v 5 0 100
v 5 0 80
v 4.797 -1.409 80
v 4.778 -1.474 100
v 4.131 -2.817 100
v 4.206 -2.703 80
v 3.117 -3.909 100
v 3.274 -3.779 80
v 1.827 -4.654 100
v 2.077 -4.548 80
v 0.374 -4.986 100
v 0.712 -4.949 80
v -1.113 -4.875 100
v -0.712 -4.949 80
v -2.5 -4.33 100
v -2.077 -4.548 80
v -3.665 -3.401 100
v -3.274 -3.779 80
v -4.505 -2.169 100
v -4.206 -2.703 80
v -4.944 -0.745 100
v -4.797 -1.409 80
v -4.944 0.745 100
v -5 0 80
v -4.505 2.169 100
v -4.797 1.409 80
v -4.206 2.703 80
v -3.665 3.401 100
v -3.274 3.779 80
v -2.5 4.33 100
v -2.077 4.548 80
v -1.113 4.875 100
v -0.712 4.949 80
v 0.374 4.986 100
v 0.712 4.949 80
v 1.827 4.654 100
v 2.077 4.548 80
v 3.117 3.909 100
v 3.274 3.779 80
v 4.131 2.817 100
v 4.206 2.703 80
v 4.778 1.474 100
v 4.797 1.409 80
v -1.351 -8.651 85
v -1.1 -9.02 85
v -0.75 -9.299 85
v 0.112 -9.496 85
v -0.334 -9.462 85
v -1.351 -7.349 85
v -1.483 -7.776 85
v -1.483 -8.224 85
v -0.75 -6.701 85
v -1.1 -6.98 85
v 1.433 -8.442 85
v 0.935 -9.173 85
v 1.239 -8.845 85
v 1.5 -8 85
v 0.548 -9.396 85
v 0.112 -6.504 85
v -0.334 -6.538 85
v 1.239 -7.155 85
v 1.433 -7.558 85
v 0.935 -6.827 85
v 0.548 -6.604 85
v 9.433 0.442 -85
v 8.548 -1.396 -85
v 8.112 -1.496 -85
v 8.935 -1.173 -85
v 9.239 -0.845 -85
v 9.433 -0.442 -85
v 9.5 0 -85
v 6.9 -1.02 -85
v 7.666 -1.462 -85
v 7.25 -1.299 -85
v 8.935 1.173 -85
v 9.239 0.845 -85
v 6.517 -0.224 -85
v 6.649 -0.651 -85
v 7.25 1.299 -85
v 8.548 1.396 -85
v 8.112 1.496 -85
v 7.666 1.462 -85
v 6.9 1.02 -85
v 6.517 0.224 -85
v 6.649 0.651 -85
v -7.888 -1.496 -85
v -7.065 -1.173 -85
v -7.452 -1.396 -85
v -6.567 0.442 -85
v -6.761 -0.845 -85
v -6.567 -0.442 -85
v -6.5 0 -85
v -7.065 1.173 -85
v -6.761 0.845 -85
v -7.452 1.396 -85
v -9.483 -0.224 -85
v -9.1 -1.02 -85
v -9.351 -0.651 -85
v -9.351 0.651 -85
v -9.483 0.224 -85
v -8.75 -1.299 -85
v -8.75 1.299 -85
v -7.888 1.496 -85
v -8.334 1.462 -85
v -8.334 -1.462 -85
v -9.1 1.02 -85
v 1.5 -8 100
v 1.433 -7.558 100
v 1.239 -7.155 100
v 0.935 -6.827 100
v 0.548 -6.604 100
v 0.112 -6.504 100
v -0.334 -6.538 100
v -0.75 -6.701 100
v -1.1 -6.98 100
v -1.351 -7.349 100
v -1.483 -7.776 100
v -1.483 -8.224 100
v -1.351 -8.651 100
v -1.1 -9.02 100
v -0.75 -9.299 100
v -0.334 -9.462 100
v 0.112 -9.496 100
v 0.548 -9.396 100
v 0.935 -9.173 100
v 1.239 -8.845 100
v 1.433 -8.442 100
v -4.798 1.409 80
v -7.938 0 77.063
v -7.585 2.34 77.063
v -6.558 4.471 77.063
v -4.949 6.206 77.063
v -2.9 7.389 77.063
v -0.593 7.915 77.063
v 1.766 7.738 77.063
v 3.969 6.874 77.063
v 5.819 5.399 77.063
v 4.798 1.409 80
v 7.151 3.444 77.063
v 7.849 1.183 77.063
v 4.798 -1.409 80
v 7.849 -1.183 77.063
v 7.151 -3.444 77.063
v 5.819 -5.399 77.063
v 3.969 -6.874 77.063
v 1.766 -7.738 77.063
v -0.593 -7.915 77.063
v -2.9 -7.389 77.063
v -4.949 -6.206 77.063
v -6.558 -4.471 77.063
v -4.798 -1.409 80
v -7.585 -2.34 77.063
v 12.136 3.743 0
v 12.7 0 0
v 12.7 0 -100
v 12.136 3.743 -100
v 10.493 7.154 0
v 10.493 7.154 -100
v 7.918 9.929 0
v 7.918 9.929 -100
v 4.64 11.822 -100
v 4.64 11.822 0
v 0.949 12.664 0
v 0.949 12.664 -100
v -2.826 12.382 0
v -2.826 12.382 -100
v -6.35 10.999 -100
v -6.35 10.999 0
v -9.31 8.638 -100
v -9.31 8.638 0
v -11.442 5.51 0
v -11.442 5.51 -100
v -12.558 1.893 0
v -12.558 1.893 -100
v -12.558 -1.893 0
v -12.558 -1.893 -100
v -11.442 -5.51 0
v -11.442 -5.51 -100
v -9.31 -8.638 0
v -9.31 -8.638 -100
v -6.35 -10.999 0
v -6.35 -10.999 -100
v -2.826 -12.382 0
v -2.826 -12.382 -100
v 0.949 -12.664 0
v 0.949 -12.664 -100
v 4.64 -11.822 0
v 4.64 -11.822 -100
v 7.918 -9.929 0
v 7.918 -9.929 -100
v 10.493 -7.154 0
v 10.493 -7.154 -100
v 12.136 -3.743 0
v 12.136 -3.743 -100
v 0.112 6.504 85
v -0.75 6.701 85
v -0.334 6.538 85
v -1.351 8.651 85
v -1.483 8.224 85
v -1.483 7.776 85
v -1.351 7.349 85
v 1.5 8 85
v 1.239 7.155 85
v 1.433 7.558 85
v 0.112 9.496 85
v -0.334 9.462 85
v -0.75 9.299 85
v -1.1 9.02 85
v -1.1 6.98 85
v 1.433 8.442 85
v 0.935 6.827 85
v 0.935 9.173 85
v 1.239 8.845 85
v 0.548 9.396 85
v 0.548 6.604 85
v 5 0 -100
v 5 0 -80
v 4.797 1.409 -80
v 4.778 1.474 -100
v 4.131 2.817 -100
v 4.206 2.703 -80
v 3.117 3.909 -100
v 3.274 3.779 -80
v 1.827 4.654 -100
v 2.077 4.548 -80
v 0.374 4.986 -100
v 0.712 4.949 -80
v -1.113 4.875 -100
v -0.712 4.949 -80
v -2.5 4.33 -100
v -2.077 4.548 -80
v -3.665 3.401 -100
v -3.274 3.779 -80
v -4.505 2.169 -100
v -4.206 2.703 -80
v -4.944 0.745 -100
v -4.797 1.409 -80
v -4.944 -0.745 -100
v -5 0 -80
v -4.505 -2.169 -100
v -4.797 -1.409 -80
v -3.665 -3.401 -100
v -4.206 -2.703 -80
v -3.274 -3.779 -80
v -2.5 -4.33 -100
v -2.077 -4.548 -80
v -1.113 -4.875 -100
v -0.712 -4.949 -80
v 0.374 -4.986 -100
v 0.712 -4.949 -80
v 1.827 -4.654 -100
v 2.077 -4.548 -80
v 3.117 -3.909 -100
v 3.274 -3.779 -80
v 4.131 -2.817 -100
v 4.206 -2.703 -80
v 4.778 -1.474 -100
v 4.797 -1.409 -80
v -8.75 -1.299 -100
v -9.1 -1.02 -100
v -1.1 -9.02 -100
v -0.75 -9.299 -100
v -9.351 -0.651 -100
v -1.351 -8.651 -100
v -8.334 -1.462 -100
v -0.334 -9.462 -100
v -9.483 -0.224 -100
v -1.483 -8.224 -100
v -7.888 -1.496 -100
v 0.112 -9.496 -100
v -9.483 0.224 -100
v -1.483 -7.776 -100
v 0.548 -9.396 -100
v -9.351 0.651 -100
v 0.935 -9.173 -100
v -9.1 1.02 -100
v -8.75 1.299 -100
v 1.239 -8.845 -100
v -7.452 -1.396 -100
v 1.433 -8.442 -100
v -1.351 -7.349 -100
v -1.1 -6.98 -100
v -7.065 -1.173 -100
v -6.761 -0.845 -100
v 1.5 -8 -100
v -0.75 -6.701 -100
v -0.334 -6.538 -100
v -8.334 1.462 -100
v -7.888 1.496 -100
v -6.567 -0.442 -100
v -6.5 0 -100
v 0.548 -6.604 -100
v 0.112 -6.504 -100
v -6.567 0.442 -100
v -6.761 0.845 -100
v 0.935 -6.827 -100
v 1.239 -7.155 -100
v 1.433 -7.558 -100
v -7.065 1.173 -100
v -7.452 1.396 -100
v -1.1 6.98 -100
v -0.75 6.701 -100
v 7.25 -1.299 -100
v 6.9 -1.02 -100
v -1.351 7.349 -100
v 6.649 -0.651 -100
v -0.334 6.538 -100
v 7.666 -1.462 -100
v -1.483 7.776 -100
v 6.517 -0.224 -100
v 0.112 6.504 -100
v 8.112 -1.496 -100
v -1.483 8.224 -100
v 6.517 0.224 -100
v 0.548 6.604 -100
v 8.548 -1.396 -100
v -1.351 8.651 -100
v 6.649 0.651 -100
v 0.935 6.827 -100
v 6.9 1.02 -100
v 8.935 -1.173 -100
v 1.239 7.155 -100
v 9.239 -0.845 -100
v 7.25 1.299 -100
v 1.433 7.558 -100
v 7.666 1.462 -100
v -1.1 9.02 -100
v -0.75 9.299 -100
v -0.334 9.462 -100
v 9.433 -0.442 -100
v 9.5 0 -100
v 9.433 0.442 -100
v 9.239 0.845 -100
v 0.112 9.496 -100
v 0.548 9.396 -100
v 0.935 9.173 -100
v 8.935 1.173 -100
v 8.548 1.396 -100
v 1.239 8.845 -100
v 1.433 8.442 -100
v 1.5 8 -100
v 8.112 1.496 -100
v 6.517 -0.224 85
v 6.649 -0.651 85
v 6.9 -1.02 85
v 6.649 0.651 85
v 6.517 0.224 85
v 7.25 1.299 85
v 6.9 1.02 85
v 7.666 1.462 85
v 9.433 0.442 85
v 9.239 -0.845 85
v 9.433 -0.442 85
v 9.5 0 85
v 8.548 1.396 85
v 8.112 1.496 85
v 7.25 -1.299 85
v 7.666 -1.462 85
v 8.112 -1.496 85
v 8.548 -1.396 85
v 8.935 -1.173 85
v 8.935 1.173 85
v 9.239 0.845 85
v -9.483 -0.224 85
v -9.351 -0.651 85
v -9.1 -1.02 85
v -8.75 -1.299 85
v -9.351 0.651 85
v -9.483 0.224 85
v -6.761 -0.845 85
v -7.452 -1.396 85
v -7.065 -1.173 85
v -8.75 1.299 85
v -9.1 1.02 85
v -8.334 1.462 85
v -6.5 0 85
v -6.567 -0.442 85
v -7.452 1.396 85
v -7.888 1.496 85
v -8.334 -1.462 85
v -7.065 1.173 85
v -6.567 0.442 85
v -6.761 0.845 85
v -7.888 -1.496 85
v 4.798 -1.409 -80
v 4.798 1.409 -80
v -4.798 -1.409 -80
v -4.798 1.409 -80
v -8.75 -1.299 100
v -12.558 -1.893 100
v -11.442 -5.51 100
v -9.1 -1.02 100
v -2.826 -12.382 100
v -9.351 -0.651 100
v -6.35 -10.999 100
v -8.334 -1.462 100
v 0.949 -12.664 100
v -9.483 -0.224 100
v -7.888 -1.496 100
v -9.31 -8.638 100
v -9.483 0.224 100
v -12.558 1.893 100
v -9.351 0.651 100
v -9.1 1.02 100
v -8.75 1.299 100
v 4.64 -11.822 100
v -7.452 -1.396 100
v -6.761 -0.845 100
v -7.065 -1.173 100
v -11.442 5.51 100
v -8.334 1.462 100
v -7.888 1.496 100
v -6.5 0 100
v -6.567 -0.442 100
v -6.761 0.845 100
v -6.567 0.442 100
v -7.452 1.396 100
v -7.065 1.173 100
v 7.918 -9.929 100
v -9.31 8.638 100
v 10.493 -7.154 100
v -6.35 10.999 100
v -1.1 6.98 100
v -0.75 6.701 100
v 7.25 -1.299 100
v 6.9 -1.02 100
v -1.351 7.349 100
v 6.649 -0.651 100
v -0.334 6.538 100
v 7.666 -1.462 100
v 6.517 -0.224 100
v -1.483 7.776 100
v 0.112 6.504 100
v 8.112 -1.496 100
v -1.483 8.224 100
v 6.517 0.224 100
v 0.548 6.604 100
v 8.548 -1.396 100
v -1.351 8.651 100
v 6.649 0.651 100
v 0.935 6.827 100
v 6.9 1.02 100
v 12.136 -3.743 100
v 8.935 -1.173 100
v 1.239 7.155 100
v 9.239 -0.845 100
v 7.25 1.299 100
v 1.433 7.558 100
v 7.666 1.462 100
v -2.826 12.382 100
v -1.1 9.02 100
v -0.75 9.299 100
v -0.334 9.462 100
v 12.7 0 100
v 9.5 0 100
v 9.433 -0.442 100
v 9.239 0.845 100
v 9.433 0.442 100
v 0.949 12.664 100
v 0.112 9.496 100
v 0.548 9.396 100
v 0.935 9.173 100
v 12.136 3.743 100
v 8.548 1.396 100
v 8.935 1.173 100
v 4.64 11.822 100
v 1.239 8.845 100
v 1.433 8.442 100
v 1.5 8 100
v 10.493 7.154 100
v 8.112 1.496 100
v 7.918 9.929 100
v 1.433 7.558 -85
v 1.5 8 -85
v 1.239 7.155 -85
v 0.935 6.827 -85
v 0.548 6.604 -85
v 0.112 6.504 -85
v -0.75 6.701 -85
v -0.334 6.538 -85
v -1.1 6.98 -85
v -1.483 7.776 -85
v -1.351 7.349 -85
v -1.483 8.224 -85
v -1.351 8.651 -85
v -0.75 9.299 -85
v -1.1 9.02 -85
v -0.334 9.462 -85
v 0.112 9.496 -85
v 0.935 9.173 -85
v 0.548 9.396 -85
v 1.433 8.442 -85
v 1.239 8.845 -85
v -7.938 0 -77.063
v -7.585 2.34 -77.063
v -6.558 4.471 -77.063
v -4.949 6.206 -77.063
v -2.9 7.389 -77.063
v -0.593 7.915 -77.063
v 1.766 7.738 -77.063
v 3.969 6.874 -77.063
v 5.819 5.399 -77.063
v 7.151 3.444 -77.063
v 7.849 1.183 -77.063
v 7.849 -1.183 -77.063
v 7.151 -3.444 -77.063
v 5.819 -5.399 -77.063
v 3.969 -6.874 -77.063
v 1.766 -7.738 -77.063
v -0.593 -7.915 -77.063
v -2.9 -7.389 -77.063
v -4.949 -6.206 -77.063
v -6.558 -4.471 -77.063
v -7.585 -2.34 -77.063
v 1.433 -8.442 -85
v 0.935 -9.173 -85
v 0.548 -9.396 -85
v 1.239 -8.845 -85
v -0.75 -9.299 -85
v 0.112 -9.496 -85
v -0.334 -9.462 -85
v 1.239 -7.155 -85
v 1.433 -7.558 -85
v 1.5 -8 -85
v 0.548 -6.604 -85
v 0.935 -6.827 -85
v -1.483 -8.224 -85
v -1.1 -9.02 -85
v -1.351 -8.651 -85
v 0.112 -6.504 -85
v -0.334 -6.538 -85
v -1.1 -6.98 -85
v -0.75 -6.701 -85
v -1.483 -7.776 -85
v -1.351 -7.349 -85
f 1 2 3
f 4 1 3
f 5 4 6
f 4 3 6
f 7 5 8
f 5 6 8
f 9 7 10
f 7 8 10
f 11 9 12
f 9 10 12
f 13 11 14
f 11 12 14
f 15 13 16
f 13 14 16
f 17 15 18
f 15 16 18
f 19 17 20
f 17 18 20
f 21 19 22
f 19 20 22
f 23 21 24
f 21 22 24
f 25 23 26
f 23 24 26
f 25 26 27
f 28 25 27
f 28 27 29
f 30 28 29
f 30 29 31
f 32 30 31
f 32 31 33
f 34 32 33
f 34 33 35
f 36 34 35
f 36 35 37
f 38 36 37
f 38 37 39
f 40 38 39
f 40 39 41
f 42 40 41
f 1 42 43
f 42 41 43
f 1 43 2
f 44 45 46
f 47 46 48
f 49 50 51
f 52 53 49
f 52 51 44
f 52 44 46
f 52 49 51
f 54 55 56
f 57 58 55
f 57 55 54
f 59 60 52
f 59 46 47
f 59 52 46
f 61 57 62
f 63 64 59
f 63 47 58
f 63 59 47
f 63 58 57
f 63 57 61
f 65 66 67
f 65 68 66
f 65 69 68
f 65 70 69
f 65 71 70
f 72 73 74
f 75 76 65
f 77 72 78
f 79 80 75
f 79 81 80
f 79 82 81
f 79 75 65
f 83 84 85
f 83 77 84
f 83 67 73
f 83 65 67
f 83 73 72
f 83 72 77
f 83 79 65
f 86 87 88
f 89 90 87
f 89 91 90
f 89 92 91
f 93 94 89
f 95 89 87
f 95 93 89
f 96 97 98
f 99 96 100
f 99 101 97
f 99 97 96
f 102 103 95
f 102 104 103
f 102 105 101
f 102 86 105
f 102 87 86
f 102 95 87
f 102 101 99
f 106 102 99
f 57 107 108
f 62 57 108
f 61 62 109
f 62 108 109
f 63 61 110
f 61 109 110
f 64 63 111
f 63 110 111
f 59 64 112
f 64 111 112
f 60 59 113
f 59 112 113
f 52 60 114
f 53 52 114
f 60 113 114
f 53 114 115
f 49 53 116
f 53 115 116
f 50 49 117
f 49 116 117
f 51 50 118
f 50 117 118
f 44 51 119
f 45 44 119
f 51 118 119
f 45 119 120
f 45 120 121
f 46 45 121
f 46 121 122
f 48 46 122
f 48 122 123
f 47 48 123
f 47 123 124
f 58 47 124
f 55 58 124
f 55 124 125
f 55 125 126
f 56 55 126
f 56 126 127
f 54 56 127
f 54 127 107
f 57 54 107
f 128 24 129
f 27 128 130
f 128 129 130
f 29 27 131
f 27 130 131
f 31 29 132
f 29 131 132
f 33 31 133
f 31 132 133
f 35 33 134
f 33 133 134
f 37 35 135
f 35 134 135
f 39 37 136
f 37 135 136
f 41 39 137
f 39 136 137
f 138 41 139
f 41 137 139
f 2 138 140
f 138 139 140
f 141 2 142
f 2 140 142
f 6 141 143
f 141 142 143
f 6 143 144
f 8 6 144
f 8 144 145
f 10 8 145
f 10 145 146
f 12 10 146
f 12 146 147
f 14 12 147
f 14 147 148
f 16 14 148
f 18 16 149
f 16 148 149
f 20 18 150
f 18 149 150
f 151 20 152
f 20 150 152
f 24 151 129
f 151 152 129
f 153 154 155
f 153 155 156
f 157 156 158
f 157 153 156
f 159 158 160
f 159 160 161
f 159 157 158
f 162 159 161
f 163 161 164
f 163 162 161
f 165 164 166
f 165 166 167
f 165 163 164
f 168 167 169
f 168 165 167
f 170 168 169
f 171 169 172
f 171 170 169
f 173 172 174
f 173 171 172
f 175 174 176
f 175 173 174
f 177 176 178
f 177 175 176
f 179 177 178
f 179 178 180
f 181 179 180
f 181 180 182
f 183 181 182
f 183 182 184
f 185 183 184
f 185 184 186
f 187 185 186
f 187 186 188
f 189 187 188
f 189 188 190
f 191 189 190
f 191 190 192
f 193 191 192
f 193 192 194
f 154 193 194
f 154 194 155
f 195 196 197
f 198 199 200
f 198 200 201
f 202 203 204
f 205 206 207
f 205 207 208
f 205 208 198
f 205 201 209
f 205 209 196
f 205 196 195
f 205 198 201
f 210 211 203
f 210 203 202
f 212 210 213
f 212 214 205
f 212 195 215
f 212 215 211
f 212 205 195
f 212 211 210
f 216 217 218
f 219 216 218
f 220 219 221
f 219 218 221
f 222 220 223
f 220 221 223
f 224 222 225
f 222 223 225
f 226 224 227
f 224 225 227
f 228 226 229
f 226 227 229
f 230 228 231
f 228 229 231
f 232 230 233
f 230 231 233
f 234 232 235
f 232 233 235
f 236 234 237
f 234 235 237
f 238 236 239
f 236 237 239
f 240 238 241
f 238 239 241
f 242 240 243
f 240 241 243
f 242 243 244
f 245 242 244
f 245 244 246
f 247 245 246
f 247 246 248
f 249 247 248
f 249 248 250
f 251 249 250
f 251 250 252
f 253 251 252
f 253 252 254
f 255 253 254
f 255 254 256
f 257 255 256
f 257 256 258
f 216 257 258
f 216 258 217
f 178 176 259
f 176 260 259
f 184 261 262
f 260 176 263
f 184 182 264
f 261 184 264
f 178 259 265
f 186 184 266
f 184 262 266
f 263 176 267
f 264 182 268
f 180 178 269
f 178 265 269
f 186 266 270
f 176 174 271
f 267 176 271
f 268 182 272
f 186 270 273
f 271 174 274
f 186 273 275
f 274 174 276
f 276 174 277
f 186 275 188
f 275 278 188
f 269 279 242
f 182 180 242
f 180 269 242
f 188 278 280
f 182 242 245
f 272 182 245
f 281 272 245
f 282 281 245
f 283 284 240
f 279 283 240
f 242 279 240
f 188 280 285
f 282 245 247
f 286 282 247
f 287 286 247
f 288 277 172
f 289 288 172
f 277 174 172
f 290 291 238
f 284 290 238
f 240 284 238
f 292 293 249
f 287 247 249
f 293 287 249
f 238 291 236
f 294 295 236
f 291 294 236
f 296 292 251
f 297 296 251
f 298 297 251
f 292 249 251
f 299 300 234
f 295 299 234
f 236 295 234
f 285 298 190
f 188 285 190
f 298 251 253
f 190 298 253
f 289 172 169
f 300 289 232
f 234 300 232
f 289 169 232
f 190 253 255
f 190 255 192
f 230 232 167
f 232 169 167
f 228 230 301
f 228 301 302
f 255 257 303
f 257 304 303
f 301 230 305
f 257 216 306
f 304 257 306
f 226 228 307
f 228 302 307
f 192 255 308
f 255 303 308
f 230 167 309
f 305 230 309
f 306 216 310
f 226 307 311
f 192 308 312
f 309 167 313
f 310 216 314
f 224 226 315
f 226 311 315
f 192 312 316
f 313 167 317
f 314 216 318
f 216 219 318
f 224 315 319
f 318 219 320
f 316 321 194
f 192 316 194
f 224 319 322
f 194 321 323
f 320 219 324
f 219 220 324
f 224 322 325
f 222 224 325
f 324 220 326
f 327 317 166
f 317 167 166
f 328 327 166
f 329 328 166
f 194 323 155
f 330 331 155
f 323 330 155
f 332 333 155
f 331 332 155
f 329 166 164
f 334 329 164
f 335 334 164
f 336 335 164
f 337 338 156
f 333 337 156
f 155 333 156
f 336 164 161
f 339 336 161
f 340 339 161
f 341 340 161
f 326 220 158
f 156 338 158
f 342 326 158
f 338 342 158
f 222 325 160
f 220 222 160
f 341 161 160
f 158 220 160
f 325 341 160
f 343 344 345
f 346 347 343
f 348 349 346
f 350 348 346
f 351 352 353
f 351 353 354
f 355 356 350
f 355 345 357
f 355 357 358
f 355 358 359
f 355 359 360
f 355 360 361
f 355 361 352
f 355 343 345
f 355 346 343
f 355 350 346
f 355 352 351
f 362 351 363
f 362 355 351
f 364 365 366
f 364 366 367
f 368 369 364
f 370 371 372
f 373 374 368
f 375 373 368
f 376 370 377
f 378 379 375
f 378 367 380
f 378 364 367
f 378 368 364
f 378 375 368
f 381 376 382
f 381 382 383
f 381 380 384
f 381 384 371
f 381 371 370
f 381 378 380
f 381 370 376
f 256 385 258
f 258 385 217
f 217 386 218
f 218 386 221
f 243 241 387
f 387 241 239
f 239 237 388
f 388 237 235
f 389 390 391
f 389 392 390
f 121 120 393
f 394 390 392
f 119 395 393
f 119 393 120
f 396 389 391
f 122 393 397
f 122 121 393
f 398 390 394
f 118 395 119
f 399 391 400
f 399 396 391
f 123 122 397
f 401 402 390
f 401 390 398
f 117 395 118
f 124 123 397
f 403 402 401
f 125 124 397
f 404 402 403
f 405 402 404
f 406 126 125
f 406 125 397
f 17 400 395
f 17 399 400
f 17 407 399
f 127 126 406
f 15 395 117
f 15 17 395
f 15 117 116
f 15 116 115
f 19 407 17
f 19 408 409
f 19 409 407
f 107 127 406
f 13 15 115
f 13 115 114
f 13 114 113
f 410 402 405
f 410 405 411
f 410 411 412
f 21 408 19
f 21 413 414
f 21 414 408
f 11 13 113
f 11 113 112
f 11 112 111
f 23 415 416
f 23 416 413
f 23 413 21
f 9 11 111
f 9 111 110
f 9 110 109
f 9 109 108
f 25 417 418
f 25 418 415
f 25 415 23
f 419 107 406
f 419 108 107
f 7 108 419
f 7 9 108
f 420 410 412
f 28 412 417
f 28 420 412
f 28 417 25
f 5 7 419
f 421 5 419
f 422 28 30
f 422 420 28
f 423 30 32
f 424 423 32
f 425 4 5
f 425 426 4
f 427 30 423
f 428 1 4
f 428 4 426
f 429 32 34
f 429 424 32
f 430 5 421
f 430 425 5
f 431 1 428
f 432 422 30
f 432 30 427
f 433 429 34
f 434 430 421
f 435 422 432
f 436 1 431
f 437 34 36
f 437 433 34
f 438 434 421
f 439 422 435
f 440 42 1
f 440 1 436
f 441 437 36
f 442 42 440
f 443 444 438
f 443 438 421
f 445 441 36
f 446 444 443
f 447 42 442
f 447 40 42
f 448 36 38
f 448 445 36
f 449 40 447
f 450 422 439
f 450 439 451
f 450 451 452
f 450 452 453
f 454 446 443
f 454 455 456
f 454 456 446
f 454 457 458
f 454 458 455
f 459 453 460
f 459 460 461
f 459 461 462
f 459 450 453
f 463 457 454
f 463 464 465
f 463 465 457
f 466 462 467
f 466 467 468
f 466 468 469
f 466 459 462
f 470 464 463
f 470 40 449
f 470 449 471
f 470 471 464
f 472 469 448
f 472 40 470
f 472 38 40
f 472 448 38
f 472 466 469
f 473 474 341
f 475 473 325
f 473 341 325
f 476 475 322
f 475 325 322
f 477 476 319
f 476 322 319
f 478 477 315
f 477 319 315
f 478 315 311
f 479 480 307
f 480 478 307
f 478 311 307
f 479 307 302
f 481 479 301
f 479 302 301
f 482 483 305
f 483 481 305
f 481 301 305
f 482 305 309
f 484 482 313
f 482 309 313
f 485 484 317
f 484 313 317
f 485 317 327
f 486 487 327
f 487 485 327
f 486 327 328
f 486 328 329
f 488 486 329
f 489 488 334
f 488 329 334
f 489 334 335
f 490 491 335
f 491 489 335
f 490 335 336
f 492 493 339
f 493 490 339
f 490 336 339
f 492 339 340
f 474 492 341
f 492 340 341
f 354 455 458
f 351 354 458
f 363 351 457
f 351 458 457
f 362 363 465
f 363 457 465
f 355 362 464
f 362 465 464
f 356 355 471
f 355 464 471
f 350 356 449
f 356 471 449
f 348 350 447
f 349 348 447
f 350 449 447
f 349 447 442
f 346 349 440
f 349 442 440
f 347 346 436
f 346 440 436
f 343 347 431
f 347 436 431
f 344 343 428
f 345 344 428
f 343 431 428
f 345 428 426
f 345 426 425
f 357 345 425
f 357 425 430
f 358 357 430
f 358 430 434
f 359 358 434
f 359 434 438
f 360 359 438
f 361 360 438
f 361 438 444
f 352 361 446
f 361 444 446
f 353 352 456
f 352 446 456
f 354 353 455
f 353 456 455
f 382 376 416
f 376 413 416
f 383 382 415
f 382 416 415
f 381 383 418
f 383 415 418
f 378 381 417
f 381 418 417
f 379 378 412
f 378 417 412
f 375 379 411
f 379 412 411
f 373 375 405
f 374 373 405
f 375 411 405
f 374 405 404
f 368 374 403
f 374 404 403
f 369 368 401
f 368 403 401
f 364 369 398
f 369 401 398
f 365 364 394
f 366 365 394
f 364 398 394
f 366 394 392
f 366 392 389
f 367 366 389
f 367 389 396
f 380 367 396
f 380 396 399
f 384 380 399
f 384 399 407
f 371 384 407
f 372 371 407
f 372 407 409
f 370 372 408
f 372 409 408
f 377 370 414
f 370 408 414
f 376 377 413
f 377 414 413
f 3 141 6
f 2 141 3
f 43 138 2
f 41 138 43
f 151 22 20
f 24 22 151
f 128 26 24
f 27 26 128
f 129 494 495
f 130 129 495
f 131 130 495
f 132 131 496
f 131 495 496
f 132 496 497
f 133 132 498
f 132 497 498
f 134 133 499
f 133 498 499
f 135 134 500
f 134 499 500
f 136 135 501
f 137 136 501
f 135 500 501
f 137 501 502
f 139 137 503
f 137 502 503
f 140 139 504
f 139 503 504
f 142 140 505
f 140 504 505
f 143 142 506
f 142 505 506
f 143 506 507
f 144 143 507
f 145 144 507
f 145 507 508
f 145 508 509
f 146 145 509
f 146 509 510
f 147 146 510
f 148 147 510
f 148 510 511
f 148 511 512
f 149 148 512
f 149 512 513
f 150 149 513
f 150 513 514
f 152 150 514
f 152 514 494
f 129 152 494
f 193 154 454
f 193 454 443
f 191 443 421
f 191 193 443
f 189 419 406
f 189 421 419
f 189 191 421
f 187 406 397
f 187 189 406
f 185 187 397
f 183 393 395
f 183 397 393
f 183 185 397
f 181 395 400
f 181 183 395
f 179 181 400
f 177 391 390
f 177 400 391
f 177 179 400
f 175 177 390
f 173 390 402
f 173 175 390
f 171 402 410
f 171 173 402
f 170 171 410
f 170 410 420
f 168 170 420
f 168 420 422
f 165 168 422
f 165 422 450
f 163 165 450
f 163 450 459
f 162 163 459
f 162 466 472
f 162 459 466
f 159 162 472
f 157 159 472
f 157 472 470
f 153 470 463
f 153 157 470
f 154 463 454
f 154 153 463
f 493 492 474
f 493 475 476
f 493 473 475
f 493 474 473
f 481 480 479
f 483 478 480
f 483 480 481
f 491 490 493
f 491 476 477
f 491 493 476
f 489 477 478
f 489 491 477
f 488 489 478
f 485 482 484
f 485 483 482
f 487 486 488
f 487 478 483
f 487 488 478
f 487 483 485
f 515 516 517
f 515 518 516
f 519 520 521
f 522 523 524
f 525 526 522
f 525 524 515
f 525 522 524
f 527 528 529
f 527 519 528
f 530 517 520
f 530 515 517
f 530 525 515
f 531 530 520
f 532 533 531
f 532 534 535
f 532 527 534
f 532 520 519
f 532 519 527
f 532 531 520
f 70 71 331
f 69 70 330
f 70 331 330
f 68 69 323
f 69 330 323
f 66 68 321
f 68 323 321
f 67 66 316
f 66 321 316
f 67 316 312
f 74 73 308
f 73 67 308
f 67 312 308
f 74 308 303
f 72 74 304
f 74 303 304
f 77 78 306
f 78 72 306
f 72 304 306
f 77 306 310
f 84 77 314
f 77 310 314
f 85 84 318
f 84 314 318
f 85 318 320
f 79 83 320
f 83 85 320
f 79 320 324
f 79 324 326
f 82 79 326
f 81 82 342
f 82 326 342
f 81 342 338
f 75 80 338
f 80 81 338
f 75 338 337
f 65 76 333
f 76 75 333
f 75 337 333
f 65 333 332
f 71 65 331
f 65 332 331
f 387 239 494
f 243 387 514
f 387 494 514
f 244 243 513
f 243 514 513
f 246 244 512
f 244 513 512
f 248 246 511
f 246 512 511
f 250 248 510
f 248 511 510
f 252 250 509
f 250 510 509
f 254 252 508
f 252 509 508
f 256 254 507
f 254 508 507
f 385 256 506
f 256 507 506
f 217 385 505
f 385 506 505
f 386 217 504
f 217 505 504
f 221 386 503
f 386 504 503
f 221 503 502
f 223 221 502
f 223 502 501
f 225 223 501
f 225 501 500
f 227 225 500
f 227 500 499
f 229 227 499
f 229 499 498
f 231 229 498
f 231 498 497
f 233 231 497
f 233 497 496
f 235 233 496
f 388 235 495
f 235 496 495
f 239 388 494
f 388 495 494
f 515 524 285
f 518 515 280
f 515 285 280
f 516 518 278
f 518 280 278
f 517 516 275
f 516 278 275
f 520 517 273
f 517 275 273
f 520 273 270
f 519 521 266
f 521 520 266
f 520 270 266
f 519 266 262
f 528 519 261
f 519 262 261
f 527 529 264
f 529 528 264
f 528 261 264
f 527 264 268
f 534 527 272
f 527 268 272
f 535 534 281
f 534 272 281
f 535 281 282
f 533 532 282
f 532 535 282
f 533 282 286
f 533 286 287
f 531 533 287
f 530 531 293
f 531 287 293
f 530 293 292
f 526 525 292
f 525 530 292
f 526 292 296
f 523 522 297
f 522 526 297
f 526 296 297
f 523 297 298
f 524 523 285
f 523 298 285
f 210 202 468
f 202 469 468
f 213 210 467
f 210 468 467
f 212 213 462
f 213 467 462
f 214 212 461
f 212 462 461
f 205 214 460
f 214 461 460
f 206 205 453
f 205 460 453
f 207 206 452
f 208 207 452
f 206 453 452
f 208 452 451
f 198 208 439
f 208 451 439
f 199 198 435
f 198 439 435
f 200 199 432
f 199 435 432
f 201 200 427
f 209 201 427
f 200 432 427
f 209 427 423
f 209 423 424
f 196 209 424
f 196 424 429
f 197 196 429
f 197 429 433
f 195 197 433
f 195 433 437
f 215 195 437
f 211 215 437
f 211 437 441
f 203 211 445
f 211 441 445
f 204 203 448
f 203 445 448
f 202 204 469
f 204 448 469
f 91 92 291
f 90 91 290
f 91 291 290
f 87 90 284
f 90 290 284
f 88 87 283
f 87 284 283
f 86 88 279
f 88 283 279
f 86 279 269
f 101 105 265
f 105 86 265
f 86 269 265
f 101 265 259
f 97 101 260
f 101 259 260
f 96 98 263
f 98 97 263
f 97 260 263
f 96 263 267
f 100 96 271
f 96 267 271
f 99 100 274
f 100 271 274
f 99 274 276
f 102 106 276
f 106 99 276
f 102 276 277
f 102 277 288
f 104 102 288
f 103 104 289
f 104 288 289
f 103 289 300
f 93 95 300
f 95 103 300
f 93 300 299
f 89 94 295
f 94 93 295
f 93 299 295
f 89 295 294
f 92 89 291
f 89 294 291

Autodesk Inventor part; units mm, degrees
ref_plane "YZ Plane" through (0, 0, 0) normal (1, 0, 0) x (0, 1, 0)
ref_plane "XZ Plane" through (0, 0, 0) normal (0, 1, 0) x (-1, 0, 0)
sketch "Sketch1" plane through (0, 0, 0) normal (0, 0, 1) x (1, 0, 0)
  circle A0 centre (0, 0) radius 12.7
  circle A1 centre (0, 0) radius 5
  dimension "d0" = 25.4
  dimension "d1" = 10
extrude "Extrusion1" add sketch "Sketch1" along normal mid plane 200
sketch "Sketch2" plane through (0, 0, 100) normal (0, 0, 1) x (1, 0, 0)
  line L0 (-17.78, 0) -> (17.78, 0) projected
  line L1 (0, -17.78) -> (0, 17.78) projected
  circle A0 centre (0, 0) radius 8 construction
  line L2 (0, 0) -> (8, 0) construction
  circle A1 centre (0, 8) radius 1.5
  circle A2 centre (-8, 0) radius 1.5
  circle A3 centre (0, -8) radius 1.5
  circle A4 centre (8, 0) radius 1.5
  point P0 (8, 0)
  point P1 (0, -8)
  point P2 (-8, 0)
  dimension "d4" = 16
  dimension "d25" = 3
  dimension "d28" = 360
extrude "Extrusion3" cut sketch "Sketch2" against normal blind 15
thread "Thread1" size "M3x0.5" class "6H" standard "ANSI Metric M Profile" full length
thread "Thread2" size "M3x0.5" class "6H" standard "ANSI Metric M Profile" full length
thread "Thread3" size "M3x0.5" class "6H" standard "ANSI Metric M Profile" full length
thread "Thread4" size "M3x0.5" class "6H" standard "ANSI Metric M Profile" full length
mirror "Mirror2" about plane through (0, 0, 0) normal (0, 0, 1) of "Extrusion3"
thread "Thread5" size "M3x0.5" class "6H" standard "ANSI Metric M Profile" full length
thread "Thread6" size "M3x0.5" class "6H" standard "ANSI Metric M Profile" full length
thread "Thread7" size "M3x0.5" class "6H" standard "ANSI Metric M Profile" full length
thread "Thread8" size "M3x0.5" class "6H" standard "ANSI Metric M Profile" full length
ref_plane "Work Plane1" through (0, 0, -80) normal (0, 0, -1) x (-1, 0, 0)
sketch "Sketch3" plane through (0, 0, -80) normal (0, 0, -1) x (-1, 0, 0)
  circle A0 centre (0, 0) radius 7.9375
  dimension "d49" = 15.875
extrude "Extrusion4" cut sketch "Sketch3" against normal blind 160
chamfer "Chamfer3" distance 2.9375 angle 45 2 edges at (7.9375, 0, 80) (7.9375, 0, -80)
properties part number "barra solida hueca para imprimir 3D"
